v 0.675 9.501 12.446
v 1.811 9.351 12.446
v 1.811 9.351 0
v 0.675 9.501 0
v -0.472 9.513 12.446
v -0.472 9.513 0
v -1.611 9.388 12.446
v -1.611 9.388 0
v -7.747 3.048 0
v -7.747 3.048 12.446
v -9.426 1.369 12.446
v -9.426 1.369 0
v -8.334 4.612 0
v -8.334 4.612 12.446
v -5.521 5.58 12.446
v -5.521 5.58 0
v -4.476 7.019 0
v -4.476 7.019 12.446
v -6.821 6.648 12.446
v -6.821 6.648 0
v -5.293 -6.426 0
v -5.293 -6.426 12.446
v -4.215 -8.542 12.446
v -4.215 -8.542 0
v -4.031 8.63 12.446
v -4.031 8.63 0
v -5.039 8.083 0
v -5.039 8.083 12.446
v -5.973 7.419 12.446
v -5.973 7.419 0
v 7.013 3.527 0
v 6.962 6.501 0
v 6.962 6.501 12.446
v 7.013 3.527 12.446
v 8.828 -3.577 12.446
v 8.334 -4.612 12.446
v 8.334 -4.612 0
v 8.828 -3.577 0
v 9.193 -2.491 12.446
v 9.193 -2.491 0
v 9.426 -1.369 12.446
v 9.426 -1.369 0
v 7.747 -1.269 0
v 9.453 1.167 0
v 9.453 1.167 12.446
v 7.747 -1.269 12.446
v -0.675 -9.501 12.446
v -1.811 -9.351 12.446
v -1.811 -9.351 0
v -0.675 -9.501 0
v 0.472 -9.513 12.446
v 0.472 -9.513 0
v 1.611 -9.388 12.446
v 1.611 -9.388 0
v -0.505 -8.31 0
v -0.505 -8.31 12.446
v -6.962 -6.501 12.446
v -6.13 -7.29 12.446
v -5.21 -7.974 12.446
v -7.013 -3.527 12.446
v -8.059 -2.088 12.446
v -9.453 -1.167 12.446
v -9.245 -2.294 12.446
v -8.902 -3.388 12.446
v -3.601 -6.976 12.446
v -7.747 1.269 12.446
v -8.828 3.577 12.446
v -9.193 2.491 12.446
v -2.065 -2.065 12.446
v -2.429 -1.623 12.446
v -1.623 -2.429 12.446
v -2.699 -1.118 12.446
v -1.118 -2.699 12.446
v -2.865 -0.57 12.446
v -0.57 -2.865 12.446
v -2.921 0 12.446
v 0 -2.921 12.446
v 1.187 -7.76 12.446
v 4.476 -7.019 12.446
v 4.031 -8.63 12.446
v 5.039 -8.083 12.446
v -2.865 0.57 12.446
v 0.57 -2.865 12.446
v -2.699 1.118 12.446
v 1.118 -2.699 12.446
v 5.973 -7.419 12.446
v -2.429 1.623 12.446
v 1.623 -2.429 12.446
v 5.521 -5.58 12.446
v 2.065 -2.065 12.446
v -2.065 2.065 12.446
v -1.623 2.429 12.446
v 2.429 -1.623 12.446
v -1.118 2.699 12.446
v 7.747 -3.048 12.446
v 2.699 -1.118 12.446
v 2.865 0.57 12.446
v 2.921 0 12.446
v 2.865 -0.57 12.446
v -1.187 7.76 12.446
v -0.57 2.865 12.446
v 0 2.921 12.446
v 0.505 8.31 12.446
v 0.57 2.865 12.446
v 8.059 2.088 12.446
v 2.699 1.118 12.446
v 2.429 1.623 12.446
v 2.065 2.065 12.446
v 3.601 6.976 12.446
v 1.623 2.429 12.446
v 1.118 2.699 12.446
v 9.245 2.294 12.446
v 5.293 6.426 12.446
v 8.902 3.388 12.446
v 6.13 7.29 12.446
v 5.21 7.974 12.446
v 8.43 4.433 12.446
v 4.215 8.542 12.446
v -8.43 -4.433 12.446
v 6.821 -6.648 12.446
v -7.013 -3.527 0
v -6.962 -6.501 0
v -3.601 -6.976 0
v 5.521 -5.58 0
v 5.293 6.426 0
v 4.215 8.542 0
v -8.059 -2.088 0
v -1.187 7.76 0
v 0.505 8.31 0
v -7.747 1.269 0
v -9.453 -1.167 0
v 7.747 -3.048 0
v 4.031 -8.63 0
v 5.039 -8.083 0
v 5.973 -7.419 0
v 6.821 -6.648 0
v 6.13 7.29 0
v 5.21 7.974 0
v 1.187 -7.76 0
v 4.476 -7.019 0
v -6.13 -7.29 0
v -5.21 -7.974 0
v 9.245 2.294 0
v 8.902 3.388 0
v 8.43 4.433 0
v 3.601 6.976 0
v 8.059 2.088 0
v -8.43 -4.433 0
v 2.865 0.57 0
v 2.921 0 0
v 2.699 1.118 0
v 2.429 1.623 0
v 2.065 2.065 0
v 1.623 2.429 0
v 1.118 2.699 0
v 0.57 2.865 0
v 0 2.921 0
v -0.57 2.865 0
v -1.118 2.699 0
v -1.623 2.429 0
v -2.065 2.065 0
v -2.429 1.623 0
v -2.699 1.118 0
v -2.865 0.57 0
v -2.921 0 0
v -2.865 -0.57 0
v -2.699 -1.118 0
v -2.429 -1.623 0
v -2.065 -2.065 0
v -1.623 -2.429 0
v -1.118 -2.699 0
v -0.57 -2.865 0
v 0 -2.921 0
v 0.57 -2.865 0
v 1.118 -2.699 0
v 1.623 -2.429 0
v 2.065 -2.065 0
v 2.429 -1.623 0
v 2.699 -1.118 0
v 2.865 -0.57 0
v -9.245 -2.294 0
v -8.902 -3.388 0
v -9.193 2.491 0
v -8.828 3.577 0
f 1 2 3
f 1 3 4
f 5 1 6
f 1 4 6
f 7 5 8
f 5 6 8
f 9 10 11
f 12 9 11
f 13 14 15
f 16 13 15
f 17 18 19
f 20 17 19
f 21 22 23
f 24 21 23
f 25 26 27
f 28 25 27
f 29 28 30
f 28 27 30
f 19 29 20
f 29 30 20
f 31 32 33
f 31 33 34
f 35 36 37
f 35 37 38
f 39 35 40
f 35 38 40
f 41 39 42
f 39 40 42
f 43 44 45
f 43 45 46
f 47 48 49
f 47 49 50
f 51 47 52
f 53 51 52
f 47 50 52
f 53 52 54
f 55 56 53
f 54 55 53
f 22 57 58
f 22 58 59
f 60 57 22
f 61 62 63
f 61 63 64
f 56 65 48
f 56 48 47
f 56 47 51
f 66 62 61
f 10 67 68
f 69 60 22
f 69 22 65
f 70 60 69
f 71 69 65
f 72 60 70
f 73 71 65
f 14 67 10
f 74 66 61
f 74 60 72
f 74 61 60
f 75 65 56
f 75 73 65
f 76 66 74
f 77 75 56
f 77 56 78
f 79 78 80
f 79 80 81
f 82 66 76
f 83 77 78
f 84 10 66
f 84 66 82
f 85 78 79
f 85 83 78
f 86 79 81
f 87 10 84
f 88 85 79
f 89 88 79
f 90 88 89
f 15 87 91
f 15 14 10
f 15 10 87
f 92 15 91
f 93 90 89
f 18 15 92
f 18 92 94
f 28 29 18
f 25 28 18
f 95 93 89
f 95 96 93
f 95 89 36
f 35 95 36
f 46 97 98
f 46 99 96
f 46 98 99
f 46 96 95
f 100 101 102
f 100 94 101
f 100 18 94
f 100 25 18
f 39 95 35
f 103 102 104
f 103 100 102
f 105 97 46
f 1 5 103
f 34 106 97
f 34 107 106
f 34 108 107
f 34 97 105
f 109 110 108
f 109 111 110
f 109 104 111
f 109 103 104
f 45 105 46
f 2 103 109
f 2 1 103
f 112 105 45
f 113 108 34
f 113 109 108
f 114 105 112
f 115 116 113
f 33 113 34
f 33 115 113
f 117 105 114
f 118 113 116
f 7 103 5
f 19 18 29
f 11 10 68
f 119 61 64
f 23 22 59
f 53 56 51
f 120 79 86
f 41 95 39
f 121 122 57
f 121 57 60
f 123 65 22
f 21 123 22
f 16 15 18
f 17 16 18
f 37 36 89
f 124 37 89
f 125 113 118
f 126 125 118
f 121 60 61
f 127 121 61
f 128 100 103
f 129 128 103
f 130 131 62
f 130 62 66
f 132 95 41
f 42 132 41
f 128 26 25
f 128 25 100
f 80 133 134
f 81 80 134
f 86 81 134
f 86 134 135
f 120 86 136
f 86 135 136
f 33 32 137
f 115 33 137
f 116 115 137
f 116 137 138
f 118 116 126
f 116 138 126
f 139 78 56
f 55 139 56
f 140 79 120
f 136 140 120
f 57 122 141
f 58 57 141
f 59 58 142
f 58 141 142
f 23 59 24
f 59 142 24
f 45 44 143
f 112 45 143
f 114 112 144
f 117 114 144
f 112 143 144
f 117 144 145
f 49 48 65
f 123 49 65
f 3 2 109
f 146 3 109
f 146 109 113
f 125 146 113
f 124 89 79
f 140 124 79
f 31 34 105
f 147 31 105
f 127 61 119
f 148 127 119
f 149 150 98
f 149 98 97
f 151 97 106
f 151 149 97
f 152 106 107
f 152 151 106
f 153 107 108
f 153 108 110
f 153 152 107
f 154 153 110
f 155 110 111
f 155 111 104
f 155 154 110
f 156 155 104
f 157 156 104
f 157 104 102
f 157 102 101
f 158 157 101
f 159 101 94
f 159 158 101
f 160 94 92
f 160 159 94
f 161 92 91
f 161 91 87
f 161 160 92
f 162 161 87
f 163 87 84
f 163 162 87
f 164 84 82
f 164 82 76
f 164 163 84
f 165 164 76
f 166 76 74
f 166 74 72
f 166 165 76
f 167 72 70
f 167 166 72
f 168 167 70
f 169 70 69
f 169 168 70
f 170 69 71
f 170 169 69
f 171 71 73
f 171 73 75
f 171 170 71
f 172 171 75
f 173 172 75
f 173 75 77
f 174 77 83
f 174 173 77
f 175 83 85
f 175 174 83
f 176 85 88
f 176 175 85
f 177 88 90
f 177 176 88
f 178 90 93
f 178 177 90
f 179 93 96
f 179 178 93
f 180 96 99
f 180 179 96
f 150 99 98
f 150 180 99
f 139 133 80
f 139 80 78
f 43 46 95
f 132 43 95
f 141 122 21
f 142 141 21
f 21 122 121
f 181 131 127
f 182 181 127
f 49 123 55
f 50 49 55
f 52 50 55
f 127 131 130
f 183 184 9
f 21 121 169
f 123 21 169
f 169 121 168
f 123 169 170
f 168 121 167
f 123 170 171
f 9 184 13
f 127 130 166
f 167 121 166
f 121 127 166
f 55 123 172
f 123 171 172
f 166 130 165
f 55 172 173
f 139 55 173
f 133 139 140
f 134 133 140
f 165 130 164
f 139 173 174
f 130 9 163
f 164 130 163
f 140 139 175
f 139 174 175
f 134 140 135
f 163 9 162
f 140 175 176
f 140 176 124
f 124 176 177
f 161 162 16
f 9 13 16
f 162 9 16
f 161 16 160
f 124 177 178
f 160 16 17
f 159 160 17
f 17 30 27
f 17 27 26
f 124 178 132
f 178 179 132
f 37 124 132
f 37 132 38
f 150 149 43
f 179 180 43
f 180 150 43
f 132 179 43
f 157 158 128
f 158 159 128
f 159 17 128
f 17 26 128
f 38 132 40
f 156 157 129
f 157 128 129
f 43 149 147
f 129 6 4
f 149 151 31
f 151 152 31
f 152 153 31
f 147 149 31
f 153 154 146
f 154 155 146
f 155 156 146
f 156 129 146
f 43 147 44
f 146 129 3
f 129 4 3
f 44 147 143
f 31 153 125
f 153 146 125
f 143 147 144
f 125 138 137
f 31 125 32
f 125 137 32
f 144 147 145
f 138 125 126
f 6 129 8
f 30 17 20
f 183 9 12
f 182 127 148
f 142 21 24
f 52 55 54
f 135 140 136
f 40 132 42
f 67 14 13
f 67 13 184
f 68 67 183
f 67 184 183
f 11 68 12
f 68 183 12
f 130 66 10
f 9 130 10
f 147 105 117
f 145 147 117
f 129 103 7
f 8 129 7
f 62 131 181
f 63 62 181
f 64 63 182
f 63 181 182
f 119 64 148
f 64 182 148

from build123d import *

# Parameters (mm, degrees)
F2_R            = 9.525
F2_R_2          = 2.921
F3_DEPTH        = 12.446
F5_DEPTH        = 12.446
F5_COPIES_COUNT = 10


# Not quite as in the source:
# - a pattern or mirror of a feature is missing from the dataset's text; its kind, count and spacing are read off the source's solid


with BuildPart() as f3:
    # F2 (on Top) → F3 (new body)
    with BuildSketch(Plane.XY):
        Circle(F2_R)
        Circle(F2_R_2, mode=Mode.SUBTRACT)
    extrude(amount=F3_DEPTH)

    # F4 (on face) → F5 (cut, through all)
    with BuildSketch(Plane.XY.offset(12.446)):
        Polygon((9.525, -1.27), (9.525, 1.27), (7.747, -1.269247156), (7.747, -3.048), align=None)
    f5 = extrude(amount=-F5_DEPTH, mode=Mode.SUBTRACT)

    # F5_copies: F5 ×10 about axis
    f5_copies_axis = Axis((0, 0, 0), (0, 0, 1))
    for i in range(1, F5_COPIES_COUNT):
        add(f5.rotate(f5_copies_axis, i * 360 / F5_COPIES_COUNT), mode=Mode.SUBTRACT)


solid = f3.part
